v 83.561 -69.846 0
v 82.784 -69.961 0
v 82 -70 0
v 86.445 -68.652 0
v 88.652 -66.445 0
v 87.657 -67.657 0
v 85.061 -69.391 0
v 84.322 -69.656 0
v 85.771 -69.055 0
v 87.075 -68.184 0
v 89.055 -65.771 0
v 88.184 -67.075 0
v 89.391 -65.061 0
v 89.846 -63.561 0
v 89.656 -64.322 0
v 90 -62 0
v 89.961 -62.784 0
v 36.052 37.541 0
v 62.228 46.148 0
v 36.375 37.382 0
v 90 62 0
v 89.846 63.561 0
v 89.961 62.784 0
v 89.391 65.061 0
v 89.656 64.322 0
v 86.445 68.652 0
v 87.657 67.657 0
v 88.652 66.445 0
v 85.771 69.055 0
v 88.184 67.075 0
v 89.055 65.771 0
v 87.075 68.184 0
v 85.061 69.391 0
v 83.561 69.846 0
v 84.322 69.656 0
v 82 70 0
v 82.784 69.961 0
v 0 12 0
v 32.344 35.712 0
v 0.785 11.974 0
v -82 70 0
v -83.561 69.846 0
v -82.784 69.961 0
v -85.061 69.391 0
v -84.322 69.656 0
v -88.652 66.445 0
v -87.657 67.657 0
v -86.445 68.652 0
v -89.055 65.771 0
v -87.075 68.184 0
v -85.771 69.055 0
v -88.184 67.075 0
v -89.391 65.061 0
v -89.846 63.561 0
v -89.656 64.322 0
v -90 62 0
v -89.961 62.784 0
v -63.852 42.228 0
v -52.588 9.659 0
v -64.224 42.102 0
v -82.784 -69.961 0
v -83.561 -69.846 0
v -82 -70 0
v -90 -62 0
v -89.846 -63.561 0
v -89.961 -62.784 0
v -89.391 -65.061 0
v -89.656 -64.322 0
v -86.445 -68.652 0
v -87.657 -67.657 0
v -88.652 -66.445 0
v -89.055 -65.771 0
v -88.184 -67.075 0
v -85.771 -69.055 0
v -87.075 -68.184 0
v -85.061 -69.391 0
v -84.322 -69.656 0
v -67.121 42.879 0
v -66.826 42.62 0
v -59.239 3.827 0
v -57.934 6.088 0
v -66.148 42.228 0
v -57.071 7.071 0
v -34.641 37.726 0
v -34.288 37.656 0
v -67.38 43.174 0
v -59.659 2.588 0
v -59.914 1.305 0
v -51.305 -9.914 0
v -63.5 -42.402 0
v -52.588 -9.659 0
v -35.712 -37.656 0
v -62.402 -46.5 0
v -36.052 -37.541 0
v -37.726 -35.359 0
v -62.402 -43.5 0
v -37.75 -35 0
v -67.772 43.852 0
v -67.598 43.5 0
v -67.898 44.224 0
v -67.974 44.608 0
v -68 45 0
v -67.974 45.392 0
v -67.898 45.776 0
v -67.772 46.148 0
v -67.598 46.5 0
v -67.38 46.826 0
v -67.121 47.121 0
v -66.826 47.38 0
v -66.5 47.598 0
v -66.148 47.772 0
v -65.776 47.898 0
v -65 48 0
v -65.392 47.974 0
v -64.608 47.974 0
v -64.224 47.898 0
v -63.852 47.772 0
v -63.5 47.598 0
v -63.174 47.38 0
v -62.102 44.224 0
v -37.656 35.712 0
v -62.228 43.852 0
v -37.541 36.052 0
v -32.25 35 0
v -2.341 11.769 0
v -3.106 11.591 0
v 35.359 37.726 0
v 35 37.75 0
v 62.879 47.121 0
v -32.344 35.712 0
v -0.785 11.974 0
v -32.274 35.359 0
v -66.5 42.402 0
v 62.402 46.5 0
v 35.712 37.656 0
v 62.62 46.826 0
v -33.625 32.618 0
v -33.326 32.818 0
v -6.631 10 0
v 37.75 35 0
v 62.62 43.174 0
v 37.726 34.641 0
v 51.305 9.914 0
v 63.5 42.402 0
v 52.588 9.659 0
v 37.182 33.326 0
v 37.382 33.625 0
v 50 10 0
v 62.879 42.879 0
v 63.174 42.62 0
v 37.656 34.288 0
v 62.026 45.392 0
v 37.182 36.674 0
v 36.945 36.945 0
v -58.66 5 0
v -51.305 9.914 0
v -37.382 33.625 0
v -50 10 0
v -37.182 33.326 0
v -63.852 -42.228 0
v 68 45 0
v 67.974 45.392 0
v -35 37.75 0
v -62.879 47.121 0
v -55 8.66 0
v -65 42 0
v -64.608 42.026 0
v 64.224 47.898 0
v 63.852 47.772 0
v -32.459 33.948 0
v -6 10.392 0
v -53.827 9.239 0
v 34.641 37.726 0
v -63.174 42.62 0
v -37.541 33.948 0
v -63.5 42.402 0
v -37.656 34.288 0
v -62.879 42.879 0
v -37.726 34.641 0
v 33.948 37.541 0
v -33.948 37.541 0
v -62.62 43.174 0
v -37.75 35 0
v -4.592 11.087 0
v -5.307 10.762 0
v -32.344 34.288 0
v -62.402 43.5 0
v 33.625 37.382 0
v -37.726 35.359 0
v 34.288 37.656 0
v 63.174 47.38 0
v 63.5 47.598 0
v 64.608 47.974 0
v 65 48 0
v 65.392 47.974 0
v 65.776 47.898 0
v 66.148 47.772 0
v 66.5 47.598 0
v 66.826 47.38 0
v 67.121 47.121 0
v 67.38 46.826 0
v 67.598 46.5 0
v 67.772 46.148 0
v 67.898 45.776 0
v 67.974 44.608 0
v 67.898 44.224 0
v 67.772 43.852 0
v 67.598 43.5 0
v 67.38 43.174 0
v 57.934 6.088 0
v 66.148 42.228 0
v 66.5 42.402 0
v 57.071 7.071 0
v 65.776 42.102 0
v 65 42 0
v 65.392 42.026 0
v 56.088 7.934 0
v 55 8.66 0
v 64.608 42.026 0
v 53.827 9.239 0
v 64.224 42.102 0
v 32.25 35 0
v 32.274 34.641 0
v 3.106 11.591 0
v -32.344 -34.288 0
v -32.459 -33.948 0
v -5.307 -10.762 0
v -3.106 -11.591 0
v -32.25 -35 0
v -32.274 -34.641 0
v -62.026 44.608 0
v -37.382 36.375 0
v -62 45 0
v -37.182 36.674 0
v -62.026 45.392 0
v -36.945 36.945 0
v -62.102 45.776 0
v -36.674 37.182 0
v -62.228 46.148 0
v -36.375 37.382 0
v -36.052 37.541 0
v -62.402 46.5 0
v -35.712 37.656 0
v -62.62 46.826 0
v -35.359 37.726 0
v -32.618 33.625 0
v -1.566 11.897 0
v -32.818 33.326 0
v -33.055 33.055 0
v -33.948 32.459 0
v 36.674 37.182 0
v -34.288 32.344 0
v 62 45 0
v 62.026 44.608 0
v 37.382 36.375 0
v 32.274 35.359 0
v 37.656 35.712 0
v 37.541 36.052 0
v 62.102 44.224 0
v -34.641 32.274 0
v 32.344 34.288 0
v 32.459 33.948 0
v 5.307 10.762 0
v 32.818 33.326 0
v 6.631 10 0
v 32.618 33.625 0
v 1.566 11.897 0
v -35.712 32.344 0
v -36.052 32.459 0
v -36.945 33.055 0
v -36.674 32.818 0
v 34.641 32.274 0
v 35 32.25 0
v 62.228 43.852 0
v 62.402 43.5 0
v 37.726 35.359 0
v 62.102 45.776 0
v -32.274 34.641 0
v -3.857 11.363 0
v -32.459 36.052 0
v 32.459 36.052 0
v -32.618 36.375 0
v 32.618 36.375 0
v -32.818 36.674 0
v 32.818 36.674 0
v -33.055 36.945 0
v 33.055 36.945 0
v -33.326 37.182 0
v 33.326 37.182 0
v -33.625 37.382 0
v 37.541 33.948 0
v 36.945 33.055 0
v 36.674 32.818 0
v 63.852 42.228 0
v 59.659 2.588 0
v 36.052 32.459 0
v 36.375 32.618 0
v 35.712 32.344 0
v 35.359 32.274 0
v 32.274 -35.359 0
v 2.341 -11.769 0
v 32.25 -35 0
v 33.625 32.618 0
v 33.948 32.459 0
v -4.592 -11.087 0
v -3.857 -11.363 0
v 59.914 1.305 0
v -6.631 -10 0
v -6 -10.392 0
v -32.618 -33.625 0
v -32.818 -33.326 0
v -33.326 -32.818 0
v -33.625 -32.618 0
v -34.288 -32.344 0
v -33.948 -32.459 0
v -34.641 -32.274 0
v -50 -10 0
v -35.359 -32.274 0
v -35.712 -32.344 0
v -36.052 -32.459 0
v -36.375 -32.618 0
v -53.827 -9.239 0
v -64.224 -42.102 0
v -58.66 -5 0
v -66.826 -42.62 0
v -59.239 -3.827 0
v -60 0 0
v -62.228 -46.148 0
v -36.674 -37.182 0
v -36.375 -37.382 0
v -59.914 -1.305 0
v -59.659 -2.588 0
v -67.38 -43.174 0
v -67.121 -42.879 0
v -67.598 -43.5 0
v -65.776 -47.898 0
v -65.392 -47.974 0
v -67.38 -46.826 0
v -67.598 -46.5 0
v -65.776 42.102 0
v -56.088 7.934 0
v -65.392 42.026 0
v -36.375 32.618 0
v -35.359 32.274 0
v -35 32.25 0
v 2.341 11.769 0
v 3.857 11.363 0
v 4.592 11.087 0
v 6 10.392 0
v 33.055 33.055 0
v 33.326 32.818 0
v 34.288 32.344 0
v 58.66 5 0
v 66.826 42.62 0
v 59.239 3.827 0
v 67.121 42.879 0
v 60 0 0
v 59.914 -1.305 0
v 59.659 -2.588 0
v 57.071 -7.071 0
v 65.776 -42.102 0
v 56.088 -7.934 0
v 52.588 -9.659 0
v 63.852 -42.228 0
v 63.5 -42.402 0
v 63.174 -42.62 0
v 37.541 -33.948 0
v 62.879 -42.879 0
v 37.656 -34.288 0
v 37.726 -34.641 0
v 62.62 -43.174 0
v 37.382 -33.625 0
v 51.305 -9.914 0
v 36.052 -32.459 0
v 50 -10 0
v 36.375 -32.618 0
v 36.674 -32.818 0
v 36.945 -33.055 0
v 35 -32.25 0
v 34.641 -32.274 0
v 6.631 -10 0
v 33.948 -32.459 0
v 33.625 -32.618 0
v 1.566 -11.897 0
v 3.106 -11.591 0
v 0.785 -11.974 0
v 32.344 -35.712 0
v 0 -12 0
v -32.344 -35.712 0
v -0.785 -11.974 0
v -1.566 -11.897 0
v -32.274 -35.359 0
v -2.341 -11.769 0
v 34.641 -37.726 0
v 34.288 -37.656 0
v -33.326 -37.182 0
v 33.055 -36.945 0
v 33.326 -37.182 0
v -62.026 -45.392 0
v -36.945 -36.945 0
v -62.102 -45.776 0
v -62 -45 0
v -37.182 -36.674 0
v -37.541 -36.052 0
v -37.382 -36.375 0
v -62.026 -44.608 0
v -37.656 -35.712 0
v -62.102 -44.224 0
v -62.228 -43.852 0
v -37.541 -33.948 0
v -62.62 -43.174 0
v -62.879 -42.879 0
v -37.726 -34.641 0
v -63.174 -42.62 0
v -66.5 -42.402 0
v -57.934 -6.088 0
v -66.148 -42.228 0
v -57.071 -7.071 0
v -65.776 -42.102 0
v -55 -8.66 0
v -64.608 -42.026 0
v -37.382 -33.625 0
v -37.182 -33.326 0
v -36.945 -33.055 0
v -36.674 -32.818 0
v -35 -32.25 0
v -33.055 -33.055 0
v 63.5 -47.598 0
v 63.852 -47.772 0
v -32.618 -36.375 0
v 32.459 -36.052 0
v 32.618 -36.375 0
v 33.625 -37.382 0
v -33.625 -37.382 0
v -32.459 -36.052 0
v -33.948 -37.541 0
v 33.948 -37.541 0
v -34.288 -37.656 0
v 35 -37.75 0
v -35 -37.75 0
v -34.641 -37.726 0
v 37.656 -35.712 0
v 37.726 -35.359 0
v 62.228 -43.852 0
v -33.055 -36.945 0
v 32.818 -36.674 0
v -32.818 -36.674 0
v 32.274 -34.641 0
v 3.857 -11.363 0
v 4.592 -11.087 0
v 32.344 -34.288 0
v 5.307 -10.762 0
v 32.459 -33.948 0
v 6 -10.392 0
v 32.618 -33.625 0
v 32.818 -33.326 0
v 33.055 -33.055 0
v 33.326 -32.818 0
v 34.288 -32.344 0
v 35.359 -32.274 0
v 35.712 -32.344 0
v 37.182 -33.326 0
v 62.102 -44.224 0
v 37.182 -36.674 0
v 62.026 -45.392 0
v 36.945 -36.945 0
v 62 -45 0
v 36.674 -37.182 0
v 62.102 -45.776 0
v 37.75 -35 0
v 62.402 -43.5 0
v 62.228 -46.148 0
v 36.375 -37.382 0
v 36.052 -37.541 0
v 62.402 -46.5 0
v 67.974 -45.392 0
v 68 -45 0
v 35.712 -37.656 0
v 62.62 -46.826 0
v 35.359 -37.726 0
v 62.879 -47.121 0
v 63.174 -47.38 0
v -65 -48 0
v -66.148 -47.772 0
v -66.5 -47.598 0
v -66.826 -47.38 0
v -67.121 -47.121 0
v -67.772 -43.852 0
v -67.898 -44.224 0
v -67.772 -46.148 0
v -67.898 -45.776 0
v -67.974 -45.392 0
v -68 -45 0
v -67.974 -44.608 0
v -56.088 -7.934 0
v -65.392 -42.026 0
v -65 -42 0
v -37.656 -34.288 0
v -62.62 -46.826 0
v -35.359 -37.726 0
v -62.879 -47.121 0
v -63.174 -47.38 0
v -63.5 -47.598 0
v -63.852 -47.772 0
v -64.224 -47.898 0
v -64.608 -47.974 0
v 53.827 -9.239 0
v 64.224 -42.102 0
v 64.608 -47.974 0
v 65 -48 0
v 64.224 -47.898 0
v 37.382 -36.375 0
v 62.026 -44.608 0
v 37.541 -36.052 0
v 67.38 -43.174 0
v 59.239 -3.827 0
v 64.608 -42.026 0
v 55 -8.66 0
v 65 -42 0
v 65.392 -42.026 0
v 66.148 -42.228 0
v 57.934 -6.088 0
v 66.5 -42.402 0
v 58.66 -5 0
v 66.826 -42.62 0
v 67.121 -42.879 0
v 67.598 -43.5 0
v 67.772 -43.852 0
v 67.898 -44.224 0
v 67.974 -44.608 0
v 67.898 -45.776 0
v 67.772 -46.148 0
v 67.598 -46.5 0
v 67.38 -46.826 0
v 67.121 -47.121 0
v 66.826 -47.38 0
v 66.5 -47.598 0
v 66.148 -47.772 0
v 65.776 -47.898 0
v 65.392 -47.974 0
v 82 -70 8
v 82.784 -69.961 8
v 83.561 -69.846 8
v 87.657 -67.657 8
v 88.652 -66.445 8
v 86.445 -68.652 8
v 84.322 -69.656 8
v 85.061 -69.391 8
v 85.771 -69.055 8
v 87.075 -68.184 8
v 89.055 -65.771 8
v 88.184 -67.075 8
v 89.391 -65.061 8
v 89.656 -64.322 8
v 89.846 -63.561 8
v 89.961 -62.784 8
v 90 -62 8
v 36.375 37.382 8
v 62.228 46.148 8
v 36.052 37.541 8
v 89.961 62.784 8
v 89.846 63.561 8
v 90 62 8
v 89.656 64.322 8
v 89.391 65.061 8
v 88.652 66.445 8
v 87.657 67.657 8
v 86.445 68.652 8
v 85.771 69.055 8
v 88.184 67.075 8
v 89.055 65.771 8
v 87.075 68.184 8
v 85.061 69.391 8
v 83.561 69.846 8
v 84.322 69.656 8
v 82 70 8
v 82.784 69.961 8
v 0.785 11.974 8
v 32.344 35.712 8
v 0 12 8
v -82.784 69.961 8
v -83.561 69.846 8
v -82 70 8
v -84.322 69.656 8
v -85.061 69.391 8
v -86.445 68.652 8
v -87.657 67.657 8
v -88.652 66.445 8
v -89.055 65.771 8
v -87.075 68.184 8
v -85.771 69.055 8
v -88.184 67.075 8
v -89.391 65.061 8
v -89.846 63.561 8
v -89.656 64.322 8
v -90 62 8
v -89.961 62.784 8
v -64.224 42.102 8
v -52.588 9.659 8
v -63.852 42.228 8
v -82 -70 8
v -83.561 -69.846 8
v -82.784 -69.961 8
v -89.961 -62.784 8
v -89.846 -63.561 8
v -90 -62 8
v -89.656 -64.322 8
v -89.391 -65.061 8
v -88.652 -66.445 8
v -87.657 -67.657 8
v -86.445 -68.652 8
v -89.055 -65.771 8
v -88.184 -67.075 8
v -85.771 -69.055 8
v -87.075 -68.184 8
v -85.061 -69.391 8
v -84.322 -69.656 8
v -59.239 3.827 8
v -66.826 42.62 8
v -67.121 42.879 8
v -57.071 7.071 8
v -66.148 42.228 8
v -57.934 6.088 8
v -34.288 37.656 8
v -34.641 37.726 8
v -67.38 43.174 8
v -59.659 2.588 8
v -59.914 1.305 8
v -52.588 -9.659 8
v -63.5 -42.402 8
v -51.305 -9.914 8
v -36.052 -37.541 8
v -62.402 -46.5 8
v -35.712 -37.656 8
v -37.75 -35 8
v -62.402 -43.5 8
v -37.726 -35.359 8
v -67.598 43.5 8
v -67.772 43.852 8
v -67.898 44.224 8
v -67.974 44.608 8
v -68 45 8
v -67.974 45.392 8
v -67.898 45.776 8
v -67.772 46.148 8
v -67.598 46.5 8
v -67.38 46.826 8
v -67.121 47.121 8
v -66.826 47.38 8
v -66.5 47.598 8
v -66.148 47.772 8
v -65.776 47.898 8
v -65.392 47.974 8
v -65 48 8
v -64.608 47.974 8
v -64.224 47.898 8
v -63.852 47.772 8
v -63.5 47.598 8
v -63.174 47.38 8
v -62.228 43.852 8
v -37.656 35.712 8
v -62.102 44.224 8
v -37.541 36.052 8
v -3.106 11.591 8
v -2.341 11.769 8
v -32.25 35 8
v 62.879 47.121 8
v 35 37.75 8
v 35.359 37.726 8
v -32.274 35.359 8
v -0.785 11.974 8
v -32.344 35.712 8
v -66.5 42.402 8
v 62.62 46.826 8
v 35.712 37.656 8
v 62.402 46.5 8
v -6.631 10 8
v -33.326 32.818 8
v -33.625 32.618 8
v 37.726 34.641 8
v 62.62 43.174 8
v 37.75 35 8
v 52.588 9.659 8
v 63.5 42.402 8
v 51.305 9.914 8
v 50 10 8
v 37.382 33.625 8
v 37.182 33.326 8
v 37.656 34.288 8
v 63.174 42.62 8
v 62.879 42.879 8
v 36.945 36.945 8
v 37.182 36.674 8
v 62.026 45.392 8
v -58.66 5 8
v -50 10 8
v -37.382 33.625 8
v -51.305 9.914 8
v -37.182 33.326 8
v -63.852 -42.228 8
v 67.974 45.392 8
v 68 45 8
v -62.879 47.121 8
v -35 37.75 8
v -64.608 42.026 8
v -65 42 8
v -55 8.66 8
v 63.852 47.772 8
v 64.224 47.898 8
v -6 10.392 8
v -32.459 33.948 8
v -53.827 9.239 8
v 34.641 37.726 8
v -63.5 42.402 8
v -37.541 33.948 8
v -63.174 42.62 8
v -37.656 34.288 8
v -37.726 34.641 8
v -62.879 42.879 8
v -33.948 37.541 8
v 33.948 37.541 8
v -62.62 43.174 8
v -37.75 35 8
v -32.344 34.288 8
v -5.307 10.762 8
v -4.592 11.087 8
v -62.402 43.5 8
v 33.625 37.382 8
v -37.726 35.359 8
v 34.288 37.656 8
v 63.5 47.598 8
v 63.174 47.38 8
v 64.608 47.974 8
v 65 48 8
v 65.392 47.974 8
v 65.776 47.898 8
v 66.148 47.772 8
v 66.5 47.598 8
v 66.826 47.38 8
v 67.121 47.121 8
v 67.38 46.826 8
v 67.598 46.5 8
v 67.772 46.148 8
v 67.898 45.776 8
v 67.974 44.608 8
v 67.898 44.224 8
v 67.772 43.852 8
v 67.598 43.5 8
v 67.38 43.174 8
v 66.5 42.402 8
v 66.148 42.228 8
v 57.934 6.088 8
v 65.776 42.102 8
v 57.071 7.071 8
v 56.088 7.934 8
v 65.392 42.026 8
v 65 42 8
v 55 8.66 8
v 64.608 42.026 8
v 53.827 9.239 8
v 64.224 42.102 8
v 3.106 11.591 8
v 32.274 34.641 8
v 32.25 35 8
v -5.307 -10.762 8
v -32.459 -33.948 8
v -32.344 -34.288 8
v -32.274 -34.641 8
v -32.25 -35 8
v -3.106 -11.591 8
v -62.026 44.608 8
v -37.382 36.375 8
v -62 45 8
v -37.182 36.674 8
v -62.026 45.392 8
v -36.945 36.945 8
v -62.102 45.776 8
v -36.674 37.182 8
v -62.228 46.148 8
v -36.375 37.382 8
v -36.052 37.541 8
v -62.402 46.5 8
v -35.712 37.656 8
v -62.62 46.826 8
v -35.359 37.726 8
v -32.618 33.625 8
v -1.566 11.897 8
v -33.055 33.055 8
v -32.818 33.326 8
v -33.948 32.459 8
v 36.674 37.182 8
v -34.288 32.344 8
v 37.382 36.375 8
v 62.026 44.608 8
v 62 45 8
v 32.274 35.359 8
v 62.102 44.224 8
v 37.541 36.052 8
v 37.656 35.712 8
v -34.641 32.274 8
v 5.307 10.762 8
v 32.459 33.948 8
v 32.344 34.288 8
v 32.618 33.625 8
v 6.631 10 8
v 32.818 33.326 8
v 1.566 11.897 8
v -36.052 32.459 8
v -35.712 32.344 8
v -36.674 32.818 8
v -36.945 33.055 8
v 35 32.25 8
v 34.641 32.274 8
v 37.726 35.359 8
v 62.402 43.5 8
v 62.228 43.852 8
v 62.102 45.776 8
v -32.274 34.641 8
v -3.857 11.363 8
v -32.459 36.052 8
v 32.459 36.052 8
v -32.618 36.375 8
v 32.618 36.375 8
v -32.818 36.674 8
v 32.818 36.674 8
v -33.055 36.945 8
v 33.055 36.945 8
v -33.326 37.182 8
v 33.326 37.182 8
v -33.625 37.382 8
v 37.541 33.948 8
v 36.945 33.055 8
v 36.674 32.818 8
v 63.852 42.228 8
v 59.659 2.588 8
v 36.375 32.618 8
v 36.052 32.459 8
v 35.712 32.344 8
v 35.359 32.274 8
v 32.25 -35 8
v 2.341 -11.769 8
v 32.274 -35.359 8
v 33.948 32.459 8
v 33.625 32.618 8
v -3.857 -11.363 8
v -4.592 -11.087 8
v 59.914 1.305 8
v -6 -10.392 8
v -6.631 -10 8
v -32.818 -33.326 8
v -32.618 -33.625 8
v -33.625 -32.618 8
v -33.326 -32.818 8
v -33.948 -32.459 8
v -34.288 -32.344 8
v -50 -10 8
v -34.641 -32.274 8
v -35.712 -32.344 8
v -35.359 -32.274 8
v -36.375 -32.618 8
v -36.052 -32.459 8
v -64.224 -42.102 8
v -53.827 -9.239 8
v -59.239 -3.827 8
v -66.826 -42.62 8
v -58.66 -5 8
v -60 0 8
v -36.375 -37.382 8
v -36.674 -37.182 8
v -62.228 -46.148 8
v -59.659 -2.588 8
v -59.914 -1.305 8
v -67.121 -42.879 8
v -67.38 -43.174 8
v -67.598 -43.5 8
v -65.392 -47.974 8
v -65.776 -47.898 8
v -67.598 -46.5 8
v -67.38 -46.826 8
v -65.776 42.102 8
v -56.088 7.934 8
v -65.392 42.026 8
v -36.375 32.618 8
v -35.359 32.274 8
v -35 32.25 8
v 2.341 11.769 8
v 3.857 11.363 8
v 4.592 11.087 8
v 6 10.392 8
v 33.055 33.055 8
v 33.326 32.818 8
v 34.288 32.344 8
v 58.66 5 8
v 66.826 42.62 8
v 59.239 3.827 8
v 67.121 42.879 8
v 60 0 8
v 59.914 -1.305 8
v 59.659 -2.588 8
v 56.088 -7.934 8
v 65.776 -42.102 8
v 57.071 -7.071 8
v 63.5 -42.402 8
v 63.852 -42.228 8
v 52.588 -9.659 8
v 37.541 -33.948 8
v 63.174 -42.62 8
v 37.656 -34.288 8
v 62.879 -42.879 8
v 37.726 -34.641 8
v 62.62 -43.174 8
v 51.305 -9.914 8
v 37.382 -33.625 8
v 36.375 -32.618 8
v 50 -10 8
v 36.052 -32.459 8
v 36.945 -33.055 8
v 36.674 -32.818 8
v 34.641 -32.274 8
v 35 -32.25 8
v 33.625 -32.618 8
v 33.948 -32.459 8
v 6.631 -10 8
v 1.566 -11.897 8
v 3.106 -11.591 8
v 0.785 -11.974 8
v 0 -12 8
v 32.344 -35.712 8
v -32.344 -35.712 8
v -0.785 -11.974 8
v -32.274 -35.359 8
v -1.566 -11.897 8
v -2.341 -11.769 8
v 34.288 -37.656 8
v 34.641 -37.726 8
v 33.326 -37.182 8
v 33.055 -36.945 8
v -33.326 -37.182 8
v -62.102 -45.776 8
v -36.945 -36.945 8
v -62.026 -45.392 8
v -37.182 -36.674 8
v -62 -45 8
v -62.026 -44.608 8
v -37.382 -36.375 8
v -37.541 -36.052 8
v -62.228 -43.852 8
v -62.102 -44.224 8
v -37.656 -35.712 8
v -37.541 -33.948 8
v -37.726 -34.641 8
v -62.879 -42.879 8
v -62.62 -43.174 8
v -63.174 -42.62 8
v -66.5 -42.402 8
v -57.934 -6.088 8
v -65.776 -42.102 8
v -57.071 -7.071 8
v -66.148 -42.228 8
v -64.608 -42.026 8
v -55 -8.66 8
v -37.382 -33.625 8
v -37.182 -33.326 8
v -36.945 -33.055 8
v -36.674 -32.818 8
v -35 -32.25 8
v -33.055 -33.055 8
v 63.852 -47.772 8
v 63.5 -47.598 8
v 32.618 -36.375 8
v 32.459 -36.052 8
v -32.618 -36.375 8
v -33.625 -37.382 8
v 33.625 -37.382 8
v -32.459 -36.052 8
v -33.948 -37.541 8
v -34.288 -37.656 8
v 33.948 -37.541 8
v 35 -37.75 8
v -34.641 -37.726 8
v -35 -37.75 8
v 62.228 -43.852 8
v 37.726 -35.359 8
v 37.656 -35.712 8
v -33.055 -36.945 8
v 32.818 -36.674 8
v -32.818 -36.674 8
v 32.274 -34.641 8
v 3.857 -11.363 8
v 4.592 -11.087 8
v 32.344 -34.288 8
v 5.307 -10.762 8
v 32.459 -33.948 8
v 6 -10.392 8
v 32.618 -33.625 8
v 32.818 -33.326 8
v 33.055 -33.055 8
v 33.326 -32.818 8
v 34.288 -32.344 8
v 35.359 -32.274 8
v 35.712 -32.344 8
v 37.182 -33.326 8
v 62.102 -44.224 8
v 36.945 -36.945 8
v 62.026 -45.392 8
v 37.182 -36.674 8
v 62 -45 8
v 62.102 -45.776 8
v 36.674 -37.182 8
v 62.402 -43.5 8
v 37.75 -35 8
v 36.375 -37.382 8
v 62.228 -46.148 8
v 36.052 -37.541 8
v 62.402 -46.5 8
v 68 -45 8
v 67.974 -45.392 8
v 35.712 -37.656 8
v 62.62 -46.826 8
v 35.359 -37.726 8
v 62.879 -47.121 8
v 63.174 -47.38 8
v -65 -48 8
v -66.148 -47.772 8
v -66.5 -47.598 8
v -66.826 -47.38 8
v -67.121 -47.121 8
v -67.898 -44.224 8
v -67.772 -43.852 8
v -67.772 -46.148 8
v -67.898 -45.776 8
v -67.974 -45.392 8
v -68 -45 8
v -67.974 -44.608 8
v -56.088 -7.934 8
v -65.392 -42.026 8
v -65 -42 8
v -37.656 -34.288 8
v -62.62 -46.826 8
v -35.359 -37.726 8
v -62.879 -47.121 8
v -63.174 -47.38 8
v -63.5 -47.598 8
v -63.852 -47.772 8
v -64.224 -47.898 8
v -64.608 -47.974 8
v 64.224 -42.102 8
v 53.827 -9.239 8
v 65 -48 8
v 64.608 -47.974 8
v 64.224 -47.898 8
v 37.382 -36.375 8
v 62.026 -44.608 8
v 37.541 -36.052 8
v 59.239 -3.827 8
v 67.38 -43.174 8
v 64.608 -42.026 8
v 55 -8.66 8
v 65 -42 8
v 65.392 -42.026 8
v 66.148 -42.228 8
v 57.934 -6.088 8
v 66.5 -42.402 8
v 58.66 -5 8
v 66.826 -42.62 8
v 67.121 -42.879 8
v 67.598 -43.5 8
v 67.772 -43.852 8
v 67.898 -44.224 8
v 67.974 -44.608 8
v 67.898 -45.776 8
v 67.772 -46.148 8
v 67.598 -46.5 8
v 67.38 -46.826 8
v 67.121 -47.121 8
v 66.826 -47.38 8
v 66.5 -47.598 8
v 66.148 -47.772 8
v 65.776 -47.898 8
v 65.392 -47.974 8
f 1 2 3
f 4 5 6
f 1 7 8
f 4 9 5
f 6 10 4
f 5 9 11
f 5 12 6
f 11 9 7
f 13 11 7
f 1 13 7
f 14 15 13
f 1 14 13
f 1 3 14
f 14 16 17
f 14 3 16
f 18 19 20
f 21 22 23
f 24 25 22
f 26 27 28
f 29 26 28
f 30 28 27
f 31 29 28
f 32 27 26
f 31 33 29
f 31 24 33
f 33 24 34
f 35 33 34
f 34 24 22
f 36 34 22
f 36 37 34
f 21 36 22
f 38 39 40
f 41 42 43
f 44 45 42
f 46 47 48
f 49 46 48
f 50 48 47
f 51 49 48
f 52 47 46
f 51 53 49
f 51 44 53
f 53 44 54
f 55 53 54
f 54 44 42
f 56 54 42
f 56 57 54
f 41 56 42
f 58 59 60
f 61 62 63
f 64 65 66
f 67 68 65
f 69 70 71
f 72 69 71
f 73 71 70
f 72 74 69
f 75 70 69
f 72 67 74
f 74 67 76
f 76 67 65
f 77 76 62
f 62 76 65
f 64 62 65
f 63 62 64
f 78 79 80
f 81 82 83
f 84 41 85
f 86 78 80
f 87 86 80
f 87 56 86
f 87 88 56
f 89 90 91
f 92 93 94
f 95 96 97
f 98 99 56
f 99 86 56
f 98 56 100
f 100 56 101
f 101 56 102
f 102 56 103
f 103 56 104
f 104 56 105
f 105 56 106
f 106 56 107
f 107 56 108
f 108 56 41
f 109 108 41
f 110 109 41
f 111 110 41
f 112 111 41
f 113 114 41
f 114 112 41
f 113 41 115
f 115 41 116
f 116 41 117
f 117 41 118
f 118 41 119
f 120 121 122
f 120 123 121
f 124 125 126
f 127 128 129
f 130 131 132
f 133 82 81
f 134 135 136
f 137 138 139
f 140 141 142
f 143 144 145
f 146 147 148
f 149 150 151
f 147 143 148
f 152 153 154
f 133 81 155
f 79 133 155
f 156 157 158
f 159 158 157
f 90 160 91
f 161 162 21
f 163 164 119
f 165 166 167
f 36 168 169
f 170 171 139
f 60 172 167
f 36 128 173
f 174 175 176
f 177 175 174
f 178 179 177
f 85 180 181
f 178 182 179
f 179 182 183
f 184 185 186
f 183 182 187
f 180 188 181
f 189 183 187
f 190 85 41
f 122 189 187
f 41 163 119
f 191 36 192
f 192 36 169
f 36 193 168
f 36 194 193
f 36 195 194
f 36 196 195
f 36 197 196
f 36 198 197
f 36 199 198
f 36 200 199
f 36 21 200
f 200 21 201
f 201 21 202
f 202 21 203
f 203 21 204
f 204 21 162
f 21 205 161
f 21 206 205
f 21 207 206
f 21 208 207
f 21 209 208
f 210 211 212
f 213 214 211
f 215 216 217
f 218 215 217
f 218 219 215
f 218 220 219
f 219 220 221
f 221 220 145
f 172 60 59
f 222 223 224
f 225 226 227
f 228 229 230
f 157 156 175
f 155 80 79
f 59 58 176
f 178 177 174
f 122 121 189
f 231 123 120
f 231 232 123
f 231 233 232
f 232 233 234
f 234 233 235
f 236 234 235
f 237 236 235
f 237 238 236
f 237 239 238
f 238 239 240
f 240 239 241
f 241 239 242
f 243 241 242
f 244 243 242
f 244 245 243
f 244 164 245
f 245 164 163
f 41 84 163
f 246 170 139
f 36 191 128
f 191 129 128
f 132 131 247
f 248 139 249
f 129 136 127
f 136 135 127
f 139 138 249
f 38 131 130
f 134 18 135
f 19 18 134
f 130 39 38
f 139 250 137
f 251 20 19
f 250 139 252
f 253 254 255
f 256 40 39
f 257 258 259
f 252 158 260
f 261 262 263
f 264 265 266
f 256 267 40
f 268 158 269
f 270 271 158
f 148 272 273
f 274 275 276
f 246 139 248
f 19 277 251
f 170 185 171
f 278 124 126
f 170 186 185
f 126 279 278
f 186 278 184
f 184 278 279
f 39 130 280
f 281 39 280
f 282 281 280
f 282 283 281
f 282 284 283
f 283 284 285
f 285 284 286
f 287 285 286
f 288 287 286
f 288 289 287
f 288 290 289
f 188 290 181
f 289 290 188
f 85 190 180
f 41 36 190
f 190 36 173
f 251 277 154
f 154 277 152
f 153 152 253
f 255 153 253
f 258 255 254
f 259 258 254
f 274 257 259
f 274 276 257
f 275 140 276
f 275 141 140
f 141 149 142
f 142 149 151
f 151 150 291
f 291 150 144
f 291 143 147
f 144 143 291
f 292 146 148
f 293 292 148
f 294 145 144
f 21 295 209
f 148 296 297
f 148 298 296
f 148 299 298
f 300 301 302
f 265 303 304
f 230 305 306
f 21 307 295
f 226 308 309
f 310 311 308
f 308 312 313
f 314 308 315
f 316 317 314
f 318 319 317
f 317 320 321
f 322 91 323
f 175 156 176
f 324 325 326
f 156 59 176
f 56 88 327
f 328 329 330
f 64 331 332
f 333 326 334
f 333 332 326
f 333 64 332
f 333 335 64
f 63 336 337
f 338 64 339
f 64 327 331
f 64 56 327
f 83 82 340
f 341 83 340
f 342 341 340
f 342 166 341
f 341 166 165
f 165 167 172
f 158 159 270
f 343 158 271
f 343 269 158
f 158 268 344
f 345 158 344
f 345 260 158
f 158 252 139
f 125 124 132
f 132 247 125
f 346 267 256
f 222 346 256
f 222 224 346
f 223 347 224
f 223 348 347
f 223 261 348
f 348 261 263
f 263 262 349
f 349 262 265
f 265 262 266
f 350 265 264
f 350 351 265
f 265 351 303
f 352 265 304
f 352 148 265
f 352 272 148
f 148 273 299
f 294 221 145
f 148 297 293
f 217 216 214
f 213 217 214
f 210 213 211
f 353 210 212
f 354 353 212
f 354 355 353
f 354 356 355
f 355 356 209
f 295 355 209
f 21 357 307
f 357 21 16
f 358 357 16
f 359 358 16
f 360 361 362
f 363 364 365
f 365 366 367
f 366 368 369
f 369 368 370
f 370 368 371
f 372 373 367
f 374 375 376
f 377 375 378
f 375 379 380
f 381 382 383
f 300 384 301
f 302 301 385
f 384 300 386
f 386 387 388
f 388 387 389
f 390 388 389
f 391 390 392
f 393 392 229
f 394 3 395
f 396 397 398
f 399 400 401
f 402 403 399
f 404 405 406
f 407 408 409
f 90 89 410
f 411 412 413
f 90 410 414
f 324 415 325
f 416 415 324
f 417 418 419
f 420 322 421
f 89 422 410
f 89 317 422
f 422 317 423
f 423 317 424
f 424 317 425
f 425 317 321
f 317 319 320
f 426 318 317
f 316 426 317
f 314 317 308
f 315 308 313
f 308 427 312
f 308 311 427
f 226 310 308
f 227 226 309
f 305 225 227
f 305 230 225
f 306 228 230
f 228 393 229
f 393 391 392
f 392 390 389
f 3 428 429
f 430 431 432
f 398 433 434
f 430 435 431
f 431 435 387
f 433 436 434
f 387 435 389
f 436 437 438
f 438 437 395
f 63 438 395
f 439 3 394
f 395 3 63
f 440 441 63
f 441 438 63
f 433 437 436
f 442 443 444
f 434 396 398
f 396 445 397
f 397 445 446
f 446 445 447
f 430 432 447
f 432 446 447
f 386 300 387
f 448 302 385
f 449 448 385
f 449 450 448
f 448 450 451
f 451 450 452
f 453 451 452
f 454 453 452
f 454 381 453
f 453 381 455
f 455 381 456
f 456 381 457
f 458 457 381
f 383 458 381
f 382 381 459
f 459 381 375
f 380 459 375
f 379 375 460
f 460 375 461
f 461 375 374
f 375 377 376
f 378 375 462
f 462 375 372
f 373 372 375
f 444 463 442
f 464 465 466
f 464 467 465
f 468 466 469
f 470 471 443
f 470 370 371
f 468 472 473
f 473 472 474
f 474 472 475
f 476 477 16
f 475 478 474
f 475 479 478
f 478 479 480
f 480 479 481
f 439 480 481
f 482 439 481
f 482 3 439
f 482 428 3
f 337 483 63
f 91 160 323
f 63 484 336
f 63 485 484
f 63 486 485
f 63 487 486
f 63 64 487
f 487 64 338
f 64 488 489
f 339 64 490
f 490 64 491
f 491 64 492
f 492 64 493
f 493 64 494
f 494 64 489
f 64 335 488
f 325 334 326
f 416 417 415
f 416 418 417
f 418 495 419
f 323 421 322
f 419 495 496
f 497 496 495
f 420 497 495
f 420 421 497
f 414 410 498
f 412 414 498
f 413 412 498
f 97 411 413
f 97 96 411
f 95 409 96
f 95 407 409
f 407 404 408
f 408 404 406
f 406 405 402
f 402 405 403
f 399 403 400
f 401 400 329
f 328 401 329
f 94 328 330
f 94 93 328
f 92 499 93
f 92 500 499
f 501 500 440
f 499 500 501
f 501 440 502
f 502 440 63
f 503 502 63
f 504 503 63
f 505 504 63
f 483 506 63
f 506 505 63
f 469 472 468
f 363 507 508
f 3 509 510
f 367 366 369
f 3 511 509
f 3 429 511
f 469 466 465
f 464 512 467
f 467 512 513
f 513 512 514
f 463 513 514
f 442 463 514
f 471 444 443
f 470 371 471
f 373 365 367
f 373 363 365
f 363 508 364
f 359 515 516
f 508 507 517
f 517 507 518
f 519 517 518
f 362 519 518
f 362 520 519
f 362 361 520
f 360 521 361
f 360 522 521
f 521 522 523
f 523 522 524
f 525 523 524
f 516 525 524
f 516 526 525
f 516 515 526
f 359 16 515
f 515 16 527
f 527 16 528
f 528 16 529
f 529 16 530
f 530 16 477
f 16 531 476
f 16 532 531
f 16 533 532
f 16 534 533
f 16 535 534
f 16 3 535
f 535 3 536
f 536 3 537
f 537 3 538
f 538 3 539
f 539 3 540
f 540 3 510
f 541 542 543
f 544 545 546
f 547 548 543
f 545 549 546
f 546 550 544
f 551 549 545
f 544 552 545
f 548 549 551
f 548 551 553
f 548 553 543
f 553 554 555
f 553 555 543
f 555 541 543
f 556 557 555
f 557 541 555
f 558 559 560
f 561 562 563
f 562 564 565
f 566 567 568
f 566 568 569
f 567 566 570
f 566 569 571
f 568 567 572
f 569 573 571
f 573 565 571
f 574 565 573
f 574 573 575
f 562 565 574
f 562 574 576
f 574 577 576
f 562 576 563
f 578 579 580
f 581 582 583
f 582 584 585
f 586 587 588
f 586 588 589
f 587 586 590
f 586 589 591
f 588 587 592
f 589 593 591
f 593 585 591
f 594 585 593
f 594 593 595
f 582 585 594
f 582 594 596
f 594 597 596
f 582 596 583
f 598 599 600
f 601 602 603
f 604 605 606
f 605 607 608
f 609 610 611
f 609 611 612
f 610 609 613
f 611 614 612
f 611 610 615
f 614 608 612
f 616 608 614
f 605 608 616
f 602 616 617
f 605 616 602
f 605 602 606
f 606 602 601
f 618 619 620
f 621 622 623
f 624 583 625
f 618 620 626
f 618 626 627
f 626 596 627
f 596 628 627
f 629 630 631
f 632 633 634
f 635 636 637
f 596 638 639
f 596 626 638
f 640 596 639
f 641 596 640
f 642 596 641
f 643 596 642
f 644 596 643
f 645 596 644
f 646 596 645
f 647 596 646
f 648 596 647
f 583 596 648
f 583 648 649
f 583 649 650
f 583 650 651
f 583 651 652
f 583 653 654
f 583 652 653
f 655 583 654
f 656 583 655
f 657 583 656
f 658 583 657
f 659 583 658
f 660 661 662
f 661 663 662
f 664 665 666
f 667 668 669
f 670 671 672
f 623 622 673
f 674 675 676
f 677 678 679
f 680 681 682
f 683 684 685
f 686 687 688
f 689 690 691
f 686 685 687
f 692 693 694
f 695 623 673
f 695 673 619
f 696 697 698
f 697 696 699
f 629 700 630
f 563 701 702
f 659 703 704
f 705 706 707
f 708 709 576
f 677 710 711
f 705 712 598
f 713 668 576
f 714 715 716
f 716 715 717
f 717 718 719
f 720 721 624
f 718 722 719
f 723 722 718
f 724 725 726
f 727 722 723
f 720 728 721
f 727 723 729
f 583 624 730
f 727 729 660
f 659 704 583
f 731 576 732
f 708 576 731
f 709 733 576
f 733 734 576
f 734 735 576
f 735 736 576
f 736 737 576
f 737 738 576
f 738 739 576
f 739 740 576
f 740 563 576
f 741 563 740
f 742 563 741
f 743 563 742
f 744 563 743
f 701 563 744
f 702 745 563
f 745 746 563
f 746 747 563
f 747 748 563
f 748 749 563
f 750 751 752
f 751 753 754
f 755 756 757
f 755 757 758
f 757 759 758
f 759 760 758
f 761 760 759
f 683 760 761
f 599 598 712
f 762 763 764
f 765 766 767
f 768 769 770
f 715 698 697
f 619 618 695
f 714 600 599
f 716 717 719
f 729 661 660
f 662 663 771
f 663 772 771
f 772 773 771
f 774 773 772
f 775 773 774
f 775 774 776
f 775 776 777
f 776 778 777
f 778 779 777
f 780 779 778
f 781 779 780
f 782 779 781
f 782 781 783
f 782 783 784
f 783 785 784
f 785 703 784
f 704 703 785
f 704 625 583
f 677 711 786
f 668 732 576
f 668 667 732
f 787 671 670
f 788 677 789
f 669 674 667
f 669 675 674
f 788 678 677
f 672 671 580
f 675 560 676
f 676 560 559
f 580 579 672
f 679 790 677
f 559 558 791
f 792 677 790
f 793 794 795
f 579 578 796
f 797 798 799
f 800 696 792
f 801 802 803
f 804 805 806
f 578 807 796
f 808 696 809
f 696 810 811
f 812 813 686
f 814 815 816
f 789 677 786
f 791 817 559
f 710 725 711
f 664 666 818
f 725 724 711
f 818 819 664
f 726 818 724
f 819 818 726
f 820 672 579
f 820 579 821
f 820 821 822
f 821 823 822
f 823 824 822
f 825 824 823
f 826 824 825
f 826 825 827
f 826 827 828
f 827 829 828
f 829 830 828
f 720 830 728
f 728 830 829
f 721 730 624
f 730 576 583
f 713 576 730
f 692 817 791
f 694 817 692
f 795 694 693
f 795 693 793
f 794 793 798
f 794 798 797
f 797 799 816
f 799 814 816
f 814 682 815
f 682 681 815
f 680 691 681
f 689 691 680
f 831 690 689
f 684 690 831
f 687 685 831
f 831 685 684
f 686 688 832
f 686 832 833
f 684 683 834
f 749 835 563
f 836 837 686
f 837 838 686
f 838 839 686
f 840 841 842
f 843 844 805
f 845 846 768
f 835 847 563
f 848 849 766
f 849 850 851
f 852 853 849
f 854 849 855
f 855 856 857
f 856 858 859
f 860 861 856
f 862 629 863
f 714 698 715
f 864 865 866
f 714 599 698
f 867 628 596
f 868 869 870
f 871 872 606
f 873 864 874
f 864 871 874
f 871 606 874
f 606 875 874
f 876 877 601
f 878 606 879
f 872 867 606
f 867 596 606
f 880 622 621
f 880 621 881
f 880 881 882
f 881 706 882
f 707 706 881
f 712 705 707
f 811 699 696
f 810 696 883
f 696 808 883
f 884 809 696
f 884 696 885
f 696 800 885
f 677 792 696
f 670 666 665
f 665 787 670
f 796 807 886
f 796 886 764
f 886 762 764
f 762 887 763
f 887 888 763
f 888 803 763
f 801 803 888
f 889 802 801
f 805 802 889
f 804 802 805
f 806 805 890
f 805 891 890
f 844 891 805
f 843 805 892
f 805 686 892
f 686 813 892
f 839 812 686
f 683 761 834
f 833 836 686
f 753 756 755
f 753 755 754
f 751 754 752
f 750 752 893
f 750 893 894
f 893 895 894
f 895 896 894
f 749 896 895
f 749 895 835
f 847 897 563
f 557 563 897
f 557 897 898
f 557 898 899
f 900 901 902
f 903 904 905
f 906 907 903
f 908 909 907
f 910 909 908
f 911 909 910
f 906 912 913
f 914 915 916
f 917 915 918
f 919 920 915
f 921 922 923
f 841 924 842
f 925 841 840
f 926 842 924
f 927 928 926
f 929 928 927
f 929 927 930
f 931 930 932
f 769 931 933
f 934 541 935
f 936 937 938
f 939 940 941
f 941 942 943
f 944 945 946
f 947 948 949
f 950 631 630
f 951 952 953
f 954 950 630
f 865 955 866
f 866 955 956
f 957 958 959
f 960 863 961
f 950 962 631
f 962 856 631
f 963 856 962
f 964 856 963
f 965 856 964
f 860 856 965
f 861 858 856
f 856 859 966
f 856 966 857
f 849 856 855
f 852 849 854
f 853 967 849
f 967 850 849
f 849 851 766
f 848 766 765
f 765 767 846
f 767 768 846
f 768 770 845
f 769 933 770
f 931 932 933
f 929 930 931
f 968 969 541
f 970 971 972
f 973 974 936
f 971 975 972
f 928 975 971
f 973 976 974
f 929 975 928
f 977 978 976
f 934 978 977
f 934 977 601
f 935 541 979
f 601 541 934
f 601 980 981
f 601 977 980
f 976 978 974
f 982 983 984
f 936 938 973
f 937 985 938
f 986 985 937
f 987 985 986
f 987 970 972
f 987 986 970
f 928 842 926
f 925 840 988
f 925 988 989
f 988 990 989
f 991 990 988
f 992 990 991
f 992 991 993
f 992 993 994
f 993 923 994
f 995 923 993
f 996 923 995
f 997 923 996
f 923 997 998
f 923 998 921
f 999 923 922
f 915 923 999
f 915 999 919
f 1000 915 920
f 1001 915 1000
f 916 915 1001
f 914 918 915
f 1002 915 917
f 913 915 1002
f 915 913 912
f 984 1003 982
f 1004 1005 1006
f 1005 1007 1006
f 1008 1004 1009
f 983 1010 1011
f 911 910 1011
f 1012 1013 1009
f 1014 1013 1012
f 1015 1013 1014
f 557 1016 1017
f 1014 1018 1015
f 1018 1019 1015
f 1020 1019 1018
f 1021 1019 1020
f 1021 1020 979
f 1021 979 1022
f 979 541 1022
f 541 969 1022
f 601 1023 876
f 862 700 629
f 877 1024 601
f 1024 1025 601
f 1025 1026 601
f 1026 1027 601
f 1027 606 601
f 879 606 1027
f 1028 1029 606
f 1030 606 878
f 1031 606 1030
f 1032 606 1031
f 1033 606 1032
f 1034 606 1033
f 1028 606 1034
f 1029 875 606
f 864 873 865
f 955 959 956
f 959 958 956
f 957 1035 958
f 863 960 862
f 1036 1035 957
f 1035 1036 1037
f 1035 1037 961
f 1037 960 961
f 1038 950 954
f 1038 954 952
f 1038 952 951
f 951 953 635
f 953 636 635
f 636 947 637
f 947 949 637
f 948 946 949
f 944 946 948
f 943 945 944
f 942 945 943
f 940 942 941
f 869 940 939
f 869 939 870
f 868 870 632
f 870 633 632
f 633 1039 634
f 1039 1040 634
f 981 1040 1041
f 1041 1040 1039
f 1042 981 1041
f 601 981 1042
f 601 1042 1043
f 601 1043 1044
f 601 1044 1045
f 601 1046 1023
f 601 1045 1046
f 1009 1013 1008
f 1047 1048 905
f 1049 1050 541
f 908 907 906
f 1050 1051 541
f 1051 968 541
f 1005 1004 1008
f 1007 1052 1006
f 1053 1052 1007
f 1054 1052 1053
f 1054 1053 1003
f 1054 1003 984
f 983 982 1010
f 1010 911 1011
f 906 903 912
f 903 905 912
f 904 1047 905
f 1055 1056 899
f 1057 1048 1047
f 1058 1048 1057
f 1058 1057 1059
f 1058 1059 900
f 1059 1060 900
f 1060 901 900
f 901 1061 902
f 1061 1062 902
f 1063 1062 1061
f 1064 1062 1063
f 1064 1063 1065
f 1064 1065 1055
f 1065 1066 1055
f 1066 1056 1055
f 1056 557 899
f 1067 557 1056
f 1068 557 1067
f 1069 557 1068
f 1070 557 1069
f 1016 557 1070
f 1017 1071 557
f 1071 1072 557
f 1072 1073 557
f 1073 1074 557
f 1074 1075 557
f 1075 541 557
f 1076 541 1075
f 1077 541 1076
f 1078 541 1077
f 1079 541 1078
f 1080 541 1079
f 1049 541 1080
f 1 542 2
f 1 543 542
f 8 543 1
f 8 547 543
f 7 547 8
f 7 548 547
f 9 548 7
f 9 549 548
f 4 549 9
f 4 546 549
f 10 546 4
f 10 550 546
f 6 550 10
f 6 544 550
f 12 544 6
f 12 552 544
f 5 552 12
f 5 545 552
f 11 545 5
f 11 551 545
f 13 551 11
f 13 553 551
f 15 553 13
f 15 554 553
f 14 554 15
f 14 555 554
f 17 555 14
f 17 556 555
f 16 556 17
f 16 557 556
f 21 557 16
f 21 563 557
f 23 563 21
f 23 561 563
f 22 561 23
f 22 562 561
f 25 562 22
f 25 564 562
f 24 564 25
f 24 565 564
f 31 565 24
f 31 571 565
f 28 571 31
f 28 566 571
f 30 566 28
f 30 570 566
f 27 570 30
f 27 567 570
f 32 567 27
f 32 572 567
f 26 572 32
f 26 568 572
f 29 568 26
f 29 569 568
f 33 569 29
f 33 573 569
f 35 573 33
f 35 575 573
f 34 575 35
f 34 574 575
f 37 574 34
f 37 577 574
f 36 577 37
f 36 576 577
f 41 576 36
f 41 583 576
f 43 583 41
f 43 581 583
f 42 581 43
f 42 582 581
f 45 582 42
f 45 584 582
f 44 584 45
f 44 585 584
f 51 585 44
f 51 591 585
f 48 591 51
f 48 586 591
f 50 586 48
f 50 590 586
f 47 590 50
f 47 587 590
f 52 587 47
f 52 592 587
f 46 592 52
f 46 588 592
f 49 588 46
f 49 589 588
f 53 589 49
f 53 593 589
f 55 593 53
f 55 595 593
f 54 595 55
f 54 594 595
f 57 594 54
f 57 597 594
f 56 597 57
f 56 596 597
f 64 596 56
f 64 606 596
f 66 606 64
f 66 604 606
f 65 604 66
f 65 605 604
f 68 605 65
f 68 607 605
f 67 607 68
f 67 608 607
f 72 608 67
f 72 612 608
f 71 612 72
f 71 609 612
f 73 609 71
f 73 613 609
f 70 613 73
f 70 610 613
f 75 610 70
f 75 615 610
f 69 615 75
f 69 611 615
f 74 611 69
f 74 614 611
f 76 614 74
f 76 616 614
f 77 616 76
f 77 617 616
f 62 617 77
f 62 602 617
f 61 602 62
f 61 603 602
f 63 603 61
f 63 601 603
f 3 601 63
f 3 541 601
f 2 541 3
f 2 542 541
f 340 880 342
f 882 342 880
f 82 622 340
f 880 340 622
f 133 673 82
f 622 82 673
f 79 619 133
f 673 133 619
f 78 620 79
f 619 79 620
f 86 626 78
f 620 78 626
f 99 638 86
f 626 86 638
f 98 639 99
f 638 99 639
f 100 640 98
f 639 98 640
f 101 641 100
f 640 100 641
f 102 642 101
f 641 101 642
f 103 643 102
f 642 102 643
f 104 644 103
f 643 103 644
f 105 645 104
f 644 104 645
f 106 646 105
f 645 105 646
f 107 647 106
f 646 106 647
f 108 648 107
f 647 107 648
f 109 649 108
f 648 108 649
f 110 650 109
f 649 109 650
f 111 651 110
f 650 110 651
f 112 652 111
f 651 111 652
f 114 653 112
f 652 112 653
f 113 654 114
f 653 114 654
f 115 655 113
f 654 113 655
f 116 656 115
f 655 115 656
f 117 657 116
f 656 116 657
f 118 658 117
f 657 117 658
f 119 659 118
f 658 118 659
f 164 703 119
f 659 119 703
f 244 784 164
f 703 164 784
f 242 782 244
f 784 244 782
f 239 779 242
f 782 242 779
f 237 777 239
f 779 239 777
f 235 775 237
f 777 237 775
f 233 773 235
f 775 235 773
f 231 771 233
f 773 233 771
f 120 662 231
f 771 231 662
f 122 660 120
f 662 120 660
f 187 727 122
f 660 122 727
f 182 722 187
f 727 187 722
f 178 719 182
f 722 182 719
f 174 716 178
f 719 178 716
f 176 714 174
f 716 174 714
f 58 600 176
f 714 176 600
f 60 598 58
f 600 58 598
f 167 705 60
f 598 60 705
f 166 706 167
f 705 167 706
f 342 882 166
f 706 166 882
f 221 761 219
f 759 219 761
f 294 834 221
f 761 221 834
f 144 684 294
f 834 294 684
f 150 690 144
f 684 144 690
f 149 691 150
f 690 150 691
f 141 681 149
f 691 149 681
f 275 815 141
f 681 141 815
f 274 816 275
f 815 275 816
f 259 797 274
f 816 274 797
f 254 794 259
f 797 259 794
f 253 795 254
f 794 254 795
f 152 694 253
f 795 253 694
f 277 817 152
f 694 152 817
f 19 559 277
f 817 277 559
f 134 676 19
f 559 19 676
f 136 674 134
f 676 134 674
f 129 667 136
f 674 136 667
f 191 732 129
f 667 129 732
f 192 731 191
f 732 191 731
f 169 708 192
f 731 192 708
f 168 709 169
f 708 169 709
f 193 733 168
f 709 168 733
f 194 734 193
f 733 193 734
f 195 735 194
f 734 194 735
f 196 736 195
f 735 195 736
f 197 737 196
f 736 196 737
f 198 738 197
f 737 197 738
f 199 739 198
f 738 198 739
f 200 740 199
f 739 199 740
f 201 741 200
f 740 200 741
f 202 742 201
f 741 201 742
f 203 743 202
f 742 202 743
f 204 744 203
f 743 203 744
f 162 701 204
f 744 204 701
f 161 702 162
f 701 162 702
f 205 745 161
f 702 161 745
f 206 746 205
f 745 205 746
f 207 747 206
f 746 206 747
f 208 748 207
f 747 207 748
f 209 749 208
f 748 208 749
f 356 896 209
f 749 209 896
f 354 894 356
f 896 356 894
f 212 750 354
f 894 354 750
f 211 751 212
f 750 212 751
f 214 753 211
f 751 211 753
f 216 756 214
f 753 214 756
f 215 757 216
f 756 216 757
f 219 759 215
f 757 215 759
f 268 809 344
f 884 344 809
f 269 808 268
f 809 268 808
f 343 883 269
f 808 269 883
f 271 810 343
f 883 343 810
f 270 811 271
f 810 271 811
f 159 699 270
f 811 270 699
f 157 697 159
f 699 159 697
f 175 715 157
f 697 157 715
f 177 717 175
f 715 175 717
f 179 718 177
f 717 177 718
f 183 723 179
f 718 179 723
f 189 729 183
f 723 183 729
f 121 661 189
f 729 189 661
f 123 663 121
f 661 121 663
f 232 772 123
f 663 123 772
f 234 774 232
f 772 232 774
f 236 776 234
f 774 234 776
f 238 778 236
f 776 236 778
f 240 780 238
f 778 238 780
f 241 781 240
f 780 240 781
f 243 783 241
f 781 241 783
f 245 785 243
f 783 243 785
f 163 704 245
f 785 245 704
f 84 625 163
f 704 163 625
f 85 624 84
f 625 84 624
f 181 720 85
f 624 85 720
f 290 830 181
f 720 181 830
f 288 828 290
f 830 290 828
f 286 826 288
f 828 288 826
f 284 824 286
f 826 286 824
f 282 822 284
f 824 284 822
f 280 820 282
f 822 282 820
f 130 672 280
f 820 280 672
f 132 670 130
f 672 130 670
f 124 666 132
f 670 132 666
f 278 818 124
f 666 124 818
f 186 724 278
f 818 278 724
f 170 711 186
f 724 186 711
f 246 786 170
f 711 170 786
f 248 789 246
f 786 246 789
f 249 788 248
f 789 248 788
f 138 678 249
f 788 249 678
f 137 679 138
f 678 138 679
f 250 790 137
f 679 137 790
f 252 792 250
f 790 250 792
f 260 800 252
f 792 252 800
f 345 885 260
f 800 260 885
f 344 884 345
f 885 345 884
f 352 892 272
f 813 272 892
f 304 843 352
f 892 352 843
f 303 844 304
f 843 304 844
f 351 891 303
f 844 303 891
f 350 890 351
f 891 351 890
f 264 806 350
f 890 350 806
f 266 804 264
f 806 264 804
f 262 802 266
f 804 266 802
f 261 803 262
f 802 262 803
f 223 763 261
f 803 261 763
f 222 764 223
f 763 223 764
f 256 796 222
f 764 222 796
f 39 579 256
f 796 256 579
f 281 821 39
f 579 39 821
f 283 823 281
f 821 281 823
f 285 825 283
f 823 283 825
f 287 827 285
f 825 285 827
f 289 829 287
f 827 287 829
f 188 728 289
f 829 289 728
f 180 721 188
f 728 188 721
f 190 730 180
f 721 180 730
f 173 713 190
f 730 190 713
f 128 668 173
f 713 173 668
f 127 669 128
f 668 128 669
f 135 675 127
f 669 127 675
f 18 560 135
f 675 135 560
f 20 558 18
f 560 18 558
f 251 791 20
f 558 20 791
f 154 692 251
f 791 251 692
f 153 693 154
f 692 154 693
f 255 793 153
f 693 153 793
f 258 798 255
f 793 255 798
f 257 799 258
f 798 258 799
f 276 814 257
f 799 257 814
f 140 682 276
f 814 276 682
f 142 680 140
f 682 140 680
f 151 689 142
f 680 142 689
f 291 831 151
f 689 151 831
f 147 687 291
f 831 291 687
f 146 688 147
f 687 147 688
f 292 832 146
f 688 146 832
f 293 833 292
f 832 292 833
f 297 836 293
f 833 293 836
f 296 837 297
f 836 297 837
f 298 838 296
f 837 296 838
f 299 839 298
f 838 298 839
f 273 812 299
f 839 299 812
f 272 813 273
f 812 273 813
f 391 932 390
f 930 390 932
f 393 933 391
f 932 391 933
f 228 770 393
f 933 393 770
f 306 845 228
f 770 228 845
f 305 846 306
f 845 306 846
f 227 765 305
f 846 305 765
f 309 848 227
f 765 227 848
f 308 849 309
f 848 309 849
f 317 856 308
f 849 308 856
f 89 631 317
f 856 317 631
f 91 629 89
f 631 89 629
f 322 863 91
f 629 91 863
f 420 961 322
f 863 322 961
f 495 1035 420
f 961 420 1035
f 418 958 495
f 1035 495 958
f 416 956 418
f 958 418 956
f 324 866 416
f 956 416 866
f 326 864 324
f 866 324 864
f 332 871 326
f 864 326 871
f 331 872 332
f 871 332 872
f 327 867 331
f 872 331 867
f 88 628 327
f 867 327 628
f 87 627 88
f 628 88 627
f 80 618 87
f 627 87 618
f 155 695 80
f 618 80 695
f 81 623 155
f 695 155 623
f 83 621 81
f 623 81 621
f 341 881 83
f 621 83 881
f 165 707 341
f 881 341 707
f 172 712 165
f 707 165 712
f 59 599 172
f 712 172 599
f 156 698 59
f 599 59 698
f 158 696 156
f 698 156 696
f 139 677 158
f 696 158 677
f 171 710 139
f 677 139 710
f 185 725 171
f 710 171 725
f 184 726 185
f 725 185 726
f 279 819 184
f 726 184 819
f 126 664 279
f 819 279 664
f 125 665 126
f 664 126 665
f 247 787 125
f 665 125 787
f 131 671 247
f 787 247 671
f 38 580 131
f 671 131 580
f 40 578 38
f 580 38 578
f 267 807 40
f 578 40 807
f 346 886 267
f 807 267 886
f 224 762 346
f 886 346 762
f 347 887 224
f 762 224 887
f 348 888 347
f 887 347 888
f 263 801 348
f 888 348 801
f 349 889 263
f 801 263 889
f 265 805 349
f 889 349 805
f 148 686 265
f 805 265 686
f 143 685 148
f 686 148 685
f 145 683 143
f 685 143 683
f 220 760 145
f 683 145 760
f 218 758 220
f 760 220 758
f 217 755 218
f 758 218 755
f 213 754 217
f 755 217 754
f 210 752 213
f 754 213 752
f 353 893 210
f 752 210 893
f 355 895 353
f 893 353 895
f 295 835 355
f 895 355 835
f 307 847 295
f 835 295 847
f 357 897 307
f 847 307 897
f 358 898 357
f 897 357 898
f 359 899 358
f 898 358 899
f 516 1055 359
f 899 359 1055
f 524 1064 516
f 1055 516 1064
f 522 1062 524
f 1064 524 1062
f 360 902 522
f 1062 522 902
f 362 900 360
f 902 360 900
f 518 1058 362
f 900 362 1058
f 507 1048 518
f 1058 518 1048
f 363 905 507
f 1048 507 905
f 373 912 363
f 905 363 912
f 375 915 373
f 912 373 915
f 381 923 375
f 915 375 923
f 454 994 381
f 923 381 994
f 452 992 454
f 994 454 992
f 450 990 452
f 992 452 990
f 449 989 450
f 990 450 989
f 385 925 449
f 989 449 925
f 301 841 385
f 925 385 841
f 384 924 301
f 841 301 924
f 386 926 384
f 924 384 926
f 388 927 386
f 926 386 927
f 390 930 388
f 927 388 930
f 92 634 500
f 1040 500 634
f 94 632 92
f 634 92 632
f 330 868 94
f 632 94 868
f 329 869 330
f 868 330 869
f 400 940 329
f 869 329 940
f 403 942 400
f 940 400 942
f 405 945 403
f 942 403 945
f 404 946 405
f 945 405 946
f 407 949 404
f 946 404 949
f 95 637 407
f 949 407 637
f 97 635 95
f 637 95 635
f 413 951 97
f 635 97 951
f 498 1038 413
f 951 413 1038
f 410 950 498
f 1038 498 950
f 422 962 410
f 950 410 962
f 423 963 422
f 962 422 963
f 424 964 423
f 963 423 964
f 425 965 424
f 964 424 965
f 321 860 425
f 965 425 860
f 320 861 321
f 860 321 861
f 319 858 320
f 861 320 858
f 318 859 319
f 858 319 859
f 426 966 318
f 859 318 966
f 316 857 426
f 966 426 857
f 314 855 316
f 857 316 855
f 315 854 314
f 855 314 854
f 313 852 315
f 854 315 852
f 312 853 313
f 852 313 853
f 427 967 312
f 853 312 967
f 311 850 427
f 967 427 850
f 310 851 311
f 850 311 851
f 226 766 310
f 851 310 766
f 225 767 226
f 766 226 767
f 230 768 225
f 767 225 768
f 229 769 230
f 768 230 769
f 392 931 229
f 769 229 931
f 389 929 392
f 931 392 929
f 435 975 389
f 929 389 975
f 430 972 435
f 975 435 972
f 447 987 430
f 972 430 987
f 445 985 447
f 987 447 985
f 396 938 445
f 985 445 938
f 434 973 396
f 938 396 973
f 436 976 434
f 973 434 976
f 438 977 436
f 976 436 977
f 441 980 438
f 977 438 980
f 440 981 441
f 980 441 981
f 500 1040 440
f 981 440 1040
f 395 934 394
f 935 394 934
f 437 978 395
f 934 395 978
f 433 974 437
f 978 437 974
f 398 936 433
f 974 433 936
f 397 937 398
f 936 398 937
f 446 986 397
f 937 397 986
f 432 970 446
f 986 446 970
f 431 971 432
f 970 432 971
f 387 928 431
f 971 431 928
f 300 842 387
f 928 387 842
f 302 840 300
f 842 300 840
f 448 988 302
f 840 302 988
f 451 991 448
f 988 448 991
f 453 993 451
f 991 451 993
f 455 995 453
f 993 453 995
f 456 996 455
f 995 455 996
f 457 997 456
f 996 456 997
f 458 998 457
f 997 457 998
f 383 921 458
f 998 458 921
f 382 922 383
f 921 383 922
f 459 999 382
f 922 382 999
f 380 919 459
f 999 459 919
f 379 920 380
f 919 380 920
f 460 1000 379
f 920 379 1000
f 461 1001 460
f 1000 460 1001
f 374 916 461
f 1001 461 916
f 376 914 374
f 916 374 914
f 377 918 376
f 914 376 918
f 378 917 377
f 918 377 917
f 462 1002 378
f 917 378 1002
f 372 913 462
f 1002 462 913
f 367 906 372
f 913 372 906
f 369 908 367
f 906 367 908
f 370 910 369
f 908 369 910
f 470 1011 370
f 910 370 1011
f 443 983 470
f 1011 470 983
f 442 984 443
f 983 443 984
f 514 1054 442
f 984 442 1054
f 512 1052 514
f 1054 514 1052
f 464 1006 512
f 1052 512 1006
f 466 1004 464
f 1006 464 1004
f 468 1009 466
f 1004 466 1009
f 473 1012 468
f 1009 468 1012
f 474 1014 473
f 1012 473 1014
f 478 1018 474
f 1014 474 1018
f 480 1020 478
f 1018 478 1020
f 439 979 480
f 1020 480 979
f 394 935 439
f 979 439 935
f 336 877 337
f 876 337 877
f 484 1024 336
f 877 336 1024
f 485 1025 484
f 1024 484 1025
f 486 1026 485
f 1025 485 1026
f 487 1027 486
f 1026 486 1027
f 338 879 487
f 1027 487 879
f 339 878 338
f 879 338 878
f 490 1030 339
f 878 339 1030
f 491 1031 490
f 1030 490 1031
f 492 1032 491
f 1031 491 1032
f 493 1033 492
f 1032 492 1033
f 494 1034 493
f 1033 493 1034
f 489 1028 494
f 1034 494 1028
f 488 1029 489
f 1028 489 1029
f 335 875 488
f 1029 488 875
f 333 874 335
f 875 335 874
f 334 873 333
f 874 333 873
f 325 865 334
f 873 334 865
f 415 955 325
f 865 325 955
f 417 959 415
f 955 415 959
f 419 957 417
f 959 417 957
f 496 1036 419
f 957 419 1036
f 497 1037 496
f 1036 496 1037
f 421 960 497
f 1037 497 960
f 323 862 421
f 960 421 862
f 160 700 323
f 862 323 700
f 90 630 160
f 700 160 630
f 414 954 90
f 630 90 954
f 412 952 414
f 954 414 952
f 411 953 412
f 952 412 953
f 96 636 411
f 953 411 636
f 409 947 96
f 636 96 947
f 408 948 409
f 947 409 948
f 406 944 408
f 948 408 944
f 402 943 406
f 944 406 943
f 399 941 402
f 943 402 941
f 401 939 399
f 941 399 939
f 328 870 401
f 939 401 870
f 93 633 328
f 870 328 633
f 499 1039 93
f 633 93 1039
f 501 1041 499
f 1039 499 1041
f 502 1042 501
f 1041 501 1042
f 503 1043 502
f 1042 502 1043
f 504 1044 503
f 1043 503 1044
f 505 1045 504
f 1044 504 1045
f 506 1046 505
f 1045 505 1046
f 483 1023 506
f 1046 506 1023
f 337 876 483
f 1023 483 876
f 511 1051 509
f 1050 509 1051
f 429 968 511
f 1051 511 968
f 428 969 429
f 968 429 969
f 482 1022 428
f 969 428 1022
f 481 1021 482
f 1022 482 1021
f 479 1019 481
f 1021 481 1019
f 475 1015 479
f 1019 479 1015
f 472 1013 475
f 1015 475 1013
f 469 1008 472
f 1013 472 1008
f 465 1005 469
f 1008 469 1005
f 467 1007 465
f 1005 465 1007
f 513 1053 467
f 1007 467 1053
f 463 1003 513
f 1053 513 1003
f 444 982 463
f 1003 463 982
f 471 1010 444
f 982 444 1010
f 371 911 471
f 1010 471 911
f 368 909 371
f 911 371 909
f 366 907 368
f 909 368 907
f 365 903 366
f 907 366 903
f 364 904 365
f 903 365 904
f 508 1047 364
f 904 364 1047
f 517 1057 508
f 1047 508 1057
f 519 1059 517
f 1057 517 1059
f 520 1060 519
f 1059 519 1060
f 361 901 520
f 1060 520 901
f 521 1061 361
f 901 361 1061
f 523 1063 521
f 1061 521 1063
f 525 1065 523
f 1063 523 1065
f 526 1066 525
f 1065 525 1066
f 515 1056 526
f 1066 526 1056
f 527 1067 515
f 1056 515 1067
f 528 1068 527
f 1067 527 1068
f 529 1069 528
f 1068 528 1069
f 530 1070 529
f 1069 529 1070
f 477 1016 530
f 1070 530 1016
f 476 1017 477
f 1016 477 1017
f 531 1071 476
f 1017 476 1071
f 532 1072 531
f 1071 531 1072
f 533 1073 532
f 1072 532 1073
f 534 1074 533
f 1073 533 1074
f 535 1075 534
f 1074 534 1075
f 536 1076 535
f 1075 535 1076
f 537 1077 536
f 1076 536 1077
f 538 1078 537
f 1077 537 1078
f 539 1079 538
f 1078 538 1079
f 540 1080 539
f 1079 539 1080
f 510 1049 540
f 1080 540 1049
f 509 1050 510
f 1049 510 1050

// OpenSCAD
// Motor Mount Plate v1
// 2D/flat plate draft for CNC / waterjet / laser reference
// Units: mm

plate_w = 180;
plate_h = 140;
plate_t = 8;
corner_r = 8;
center_hole_d = 24;
motor_hole_d = 5.5;
frame_hole_d = 6.0;
slot_w = 20;
slot_len = 120;

// Default provisional motor pattern around center.
// Must be re-checked with actual 6374 motor drawing after purchase.
motor_dx = 35;
motor_dy = 35;
frame_dx = 65;
frame_dy = 45;

module rounded_rect_2d(w, h, r) {
    hull() {
        translate([-(w/2-r), -(h/2-r)]) circle(r=r, $fn=64);
        translate([ (w/2-r), -(h/2-r)]) circle(r=r, $fn=64);
        translate([-(w/2-r),  (h/2-r)]) circle(r=r, $fn=64);
        translate([ (w/2-r),  (h/2-r)]) circle(r=r, $fn=64);
    }
}

module plate_2d() {
    difference() {
        rounded_rect_2d(plate_w, plate_h, corner_r);

        // center shaft hole
        circle(d=center_hole_d, $fn=96);

        // provisional motor mounting holes
        for (x=[-motor_dx, motor_dx])
            for (y=[-motor_dy, motor_dy])
                translate([x, y]) circle(d=motor_hole_d, $fn=48);

        // frame mounting holes
        for (x=[-frame_dx, frame_dx])
            for (y=[-frame_dy, frame_dy])
                translate([x, y]) circle(d=frame_hole_d, $fn=48);

        // horizontal adjustment slot region
        hull() {
            translate([-(slot_len/2-slot_w/2), 0]) circle(d=slot_w, $fn=48);
            translate([ (slot_len/2-slot_w/2), 0]) circle(d=slot_w, $fn=48);
        }
    }
}

linear_extrude(height=plate_t)
    plate_2d();
